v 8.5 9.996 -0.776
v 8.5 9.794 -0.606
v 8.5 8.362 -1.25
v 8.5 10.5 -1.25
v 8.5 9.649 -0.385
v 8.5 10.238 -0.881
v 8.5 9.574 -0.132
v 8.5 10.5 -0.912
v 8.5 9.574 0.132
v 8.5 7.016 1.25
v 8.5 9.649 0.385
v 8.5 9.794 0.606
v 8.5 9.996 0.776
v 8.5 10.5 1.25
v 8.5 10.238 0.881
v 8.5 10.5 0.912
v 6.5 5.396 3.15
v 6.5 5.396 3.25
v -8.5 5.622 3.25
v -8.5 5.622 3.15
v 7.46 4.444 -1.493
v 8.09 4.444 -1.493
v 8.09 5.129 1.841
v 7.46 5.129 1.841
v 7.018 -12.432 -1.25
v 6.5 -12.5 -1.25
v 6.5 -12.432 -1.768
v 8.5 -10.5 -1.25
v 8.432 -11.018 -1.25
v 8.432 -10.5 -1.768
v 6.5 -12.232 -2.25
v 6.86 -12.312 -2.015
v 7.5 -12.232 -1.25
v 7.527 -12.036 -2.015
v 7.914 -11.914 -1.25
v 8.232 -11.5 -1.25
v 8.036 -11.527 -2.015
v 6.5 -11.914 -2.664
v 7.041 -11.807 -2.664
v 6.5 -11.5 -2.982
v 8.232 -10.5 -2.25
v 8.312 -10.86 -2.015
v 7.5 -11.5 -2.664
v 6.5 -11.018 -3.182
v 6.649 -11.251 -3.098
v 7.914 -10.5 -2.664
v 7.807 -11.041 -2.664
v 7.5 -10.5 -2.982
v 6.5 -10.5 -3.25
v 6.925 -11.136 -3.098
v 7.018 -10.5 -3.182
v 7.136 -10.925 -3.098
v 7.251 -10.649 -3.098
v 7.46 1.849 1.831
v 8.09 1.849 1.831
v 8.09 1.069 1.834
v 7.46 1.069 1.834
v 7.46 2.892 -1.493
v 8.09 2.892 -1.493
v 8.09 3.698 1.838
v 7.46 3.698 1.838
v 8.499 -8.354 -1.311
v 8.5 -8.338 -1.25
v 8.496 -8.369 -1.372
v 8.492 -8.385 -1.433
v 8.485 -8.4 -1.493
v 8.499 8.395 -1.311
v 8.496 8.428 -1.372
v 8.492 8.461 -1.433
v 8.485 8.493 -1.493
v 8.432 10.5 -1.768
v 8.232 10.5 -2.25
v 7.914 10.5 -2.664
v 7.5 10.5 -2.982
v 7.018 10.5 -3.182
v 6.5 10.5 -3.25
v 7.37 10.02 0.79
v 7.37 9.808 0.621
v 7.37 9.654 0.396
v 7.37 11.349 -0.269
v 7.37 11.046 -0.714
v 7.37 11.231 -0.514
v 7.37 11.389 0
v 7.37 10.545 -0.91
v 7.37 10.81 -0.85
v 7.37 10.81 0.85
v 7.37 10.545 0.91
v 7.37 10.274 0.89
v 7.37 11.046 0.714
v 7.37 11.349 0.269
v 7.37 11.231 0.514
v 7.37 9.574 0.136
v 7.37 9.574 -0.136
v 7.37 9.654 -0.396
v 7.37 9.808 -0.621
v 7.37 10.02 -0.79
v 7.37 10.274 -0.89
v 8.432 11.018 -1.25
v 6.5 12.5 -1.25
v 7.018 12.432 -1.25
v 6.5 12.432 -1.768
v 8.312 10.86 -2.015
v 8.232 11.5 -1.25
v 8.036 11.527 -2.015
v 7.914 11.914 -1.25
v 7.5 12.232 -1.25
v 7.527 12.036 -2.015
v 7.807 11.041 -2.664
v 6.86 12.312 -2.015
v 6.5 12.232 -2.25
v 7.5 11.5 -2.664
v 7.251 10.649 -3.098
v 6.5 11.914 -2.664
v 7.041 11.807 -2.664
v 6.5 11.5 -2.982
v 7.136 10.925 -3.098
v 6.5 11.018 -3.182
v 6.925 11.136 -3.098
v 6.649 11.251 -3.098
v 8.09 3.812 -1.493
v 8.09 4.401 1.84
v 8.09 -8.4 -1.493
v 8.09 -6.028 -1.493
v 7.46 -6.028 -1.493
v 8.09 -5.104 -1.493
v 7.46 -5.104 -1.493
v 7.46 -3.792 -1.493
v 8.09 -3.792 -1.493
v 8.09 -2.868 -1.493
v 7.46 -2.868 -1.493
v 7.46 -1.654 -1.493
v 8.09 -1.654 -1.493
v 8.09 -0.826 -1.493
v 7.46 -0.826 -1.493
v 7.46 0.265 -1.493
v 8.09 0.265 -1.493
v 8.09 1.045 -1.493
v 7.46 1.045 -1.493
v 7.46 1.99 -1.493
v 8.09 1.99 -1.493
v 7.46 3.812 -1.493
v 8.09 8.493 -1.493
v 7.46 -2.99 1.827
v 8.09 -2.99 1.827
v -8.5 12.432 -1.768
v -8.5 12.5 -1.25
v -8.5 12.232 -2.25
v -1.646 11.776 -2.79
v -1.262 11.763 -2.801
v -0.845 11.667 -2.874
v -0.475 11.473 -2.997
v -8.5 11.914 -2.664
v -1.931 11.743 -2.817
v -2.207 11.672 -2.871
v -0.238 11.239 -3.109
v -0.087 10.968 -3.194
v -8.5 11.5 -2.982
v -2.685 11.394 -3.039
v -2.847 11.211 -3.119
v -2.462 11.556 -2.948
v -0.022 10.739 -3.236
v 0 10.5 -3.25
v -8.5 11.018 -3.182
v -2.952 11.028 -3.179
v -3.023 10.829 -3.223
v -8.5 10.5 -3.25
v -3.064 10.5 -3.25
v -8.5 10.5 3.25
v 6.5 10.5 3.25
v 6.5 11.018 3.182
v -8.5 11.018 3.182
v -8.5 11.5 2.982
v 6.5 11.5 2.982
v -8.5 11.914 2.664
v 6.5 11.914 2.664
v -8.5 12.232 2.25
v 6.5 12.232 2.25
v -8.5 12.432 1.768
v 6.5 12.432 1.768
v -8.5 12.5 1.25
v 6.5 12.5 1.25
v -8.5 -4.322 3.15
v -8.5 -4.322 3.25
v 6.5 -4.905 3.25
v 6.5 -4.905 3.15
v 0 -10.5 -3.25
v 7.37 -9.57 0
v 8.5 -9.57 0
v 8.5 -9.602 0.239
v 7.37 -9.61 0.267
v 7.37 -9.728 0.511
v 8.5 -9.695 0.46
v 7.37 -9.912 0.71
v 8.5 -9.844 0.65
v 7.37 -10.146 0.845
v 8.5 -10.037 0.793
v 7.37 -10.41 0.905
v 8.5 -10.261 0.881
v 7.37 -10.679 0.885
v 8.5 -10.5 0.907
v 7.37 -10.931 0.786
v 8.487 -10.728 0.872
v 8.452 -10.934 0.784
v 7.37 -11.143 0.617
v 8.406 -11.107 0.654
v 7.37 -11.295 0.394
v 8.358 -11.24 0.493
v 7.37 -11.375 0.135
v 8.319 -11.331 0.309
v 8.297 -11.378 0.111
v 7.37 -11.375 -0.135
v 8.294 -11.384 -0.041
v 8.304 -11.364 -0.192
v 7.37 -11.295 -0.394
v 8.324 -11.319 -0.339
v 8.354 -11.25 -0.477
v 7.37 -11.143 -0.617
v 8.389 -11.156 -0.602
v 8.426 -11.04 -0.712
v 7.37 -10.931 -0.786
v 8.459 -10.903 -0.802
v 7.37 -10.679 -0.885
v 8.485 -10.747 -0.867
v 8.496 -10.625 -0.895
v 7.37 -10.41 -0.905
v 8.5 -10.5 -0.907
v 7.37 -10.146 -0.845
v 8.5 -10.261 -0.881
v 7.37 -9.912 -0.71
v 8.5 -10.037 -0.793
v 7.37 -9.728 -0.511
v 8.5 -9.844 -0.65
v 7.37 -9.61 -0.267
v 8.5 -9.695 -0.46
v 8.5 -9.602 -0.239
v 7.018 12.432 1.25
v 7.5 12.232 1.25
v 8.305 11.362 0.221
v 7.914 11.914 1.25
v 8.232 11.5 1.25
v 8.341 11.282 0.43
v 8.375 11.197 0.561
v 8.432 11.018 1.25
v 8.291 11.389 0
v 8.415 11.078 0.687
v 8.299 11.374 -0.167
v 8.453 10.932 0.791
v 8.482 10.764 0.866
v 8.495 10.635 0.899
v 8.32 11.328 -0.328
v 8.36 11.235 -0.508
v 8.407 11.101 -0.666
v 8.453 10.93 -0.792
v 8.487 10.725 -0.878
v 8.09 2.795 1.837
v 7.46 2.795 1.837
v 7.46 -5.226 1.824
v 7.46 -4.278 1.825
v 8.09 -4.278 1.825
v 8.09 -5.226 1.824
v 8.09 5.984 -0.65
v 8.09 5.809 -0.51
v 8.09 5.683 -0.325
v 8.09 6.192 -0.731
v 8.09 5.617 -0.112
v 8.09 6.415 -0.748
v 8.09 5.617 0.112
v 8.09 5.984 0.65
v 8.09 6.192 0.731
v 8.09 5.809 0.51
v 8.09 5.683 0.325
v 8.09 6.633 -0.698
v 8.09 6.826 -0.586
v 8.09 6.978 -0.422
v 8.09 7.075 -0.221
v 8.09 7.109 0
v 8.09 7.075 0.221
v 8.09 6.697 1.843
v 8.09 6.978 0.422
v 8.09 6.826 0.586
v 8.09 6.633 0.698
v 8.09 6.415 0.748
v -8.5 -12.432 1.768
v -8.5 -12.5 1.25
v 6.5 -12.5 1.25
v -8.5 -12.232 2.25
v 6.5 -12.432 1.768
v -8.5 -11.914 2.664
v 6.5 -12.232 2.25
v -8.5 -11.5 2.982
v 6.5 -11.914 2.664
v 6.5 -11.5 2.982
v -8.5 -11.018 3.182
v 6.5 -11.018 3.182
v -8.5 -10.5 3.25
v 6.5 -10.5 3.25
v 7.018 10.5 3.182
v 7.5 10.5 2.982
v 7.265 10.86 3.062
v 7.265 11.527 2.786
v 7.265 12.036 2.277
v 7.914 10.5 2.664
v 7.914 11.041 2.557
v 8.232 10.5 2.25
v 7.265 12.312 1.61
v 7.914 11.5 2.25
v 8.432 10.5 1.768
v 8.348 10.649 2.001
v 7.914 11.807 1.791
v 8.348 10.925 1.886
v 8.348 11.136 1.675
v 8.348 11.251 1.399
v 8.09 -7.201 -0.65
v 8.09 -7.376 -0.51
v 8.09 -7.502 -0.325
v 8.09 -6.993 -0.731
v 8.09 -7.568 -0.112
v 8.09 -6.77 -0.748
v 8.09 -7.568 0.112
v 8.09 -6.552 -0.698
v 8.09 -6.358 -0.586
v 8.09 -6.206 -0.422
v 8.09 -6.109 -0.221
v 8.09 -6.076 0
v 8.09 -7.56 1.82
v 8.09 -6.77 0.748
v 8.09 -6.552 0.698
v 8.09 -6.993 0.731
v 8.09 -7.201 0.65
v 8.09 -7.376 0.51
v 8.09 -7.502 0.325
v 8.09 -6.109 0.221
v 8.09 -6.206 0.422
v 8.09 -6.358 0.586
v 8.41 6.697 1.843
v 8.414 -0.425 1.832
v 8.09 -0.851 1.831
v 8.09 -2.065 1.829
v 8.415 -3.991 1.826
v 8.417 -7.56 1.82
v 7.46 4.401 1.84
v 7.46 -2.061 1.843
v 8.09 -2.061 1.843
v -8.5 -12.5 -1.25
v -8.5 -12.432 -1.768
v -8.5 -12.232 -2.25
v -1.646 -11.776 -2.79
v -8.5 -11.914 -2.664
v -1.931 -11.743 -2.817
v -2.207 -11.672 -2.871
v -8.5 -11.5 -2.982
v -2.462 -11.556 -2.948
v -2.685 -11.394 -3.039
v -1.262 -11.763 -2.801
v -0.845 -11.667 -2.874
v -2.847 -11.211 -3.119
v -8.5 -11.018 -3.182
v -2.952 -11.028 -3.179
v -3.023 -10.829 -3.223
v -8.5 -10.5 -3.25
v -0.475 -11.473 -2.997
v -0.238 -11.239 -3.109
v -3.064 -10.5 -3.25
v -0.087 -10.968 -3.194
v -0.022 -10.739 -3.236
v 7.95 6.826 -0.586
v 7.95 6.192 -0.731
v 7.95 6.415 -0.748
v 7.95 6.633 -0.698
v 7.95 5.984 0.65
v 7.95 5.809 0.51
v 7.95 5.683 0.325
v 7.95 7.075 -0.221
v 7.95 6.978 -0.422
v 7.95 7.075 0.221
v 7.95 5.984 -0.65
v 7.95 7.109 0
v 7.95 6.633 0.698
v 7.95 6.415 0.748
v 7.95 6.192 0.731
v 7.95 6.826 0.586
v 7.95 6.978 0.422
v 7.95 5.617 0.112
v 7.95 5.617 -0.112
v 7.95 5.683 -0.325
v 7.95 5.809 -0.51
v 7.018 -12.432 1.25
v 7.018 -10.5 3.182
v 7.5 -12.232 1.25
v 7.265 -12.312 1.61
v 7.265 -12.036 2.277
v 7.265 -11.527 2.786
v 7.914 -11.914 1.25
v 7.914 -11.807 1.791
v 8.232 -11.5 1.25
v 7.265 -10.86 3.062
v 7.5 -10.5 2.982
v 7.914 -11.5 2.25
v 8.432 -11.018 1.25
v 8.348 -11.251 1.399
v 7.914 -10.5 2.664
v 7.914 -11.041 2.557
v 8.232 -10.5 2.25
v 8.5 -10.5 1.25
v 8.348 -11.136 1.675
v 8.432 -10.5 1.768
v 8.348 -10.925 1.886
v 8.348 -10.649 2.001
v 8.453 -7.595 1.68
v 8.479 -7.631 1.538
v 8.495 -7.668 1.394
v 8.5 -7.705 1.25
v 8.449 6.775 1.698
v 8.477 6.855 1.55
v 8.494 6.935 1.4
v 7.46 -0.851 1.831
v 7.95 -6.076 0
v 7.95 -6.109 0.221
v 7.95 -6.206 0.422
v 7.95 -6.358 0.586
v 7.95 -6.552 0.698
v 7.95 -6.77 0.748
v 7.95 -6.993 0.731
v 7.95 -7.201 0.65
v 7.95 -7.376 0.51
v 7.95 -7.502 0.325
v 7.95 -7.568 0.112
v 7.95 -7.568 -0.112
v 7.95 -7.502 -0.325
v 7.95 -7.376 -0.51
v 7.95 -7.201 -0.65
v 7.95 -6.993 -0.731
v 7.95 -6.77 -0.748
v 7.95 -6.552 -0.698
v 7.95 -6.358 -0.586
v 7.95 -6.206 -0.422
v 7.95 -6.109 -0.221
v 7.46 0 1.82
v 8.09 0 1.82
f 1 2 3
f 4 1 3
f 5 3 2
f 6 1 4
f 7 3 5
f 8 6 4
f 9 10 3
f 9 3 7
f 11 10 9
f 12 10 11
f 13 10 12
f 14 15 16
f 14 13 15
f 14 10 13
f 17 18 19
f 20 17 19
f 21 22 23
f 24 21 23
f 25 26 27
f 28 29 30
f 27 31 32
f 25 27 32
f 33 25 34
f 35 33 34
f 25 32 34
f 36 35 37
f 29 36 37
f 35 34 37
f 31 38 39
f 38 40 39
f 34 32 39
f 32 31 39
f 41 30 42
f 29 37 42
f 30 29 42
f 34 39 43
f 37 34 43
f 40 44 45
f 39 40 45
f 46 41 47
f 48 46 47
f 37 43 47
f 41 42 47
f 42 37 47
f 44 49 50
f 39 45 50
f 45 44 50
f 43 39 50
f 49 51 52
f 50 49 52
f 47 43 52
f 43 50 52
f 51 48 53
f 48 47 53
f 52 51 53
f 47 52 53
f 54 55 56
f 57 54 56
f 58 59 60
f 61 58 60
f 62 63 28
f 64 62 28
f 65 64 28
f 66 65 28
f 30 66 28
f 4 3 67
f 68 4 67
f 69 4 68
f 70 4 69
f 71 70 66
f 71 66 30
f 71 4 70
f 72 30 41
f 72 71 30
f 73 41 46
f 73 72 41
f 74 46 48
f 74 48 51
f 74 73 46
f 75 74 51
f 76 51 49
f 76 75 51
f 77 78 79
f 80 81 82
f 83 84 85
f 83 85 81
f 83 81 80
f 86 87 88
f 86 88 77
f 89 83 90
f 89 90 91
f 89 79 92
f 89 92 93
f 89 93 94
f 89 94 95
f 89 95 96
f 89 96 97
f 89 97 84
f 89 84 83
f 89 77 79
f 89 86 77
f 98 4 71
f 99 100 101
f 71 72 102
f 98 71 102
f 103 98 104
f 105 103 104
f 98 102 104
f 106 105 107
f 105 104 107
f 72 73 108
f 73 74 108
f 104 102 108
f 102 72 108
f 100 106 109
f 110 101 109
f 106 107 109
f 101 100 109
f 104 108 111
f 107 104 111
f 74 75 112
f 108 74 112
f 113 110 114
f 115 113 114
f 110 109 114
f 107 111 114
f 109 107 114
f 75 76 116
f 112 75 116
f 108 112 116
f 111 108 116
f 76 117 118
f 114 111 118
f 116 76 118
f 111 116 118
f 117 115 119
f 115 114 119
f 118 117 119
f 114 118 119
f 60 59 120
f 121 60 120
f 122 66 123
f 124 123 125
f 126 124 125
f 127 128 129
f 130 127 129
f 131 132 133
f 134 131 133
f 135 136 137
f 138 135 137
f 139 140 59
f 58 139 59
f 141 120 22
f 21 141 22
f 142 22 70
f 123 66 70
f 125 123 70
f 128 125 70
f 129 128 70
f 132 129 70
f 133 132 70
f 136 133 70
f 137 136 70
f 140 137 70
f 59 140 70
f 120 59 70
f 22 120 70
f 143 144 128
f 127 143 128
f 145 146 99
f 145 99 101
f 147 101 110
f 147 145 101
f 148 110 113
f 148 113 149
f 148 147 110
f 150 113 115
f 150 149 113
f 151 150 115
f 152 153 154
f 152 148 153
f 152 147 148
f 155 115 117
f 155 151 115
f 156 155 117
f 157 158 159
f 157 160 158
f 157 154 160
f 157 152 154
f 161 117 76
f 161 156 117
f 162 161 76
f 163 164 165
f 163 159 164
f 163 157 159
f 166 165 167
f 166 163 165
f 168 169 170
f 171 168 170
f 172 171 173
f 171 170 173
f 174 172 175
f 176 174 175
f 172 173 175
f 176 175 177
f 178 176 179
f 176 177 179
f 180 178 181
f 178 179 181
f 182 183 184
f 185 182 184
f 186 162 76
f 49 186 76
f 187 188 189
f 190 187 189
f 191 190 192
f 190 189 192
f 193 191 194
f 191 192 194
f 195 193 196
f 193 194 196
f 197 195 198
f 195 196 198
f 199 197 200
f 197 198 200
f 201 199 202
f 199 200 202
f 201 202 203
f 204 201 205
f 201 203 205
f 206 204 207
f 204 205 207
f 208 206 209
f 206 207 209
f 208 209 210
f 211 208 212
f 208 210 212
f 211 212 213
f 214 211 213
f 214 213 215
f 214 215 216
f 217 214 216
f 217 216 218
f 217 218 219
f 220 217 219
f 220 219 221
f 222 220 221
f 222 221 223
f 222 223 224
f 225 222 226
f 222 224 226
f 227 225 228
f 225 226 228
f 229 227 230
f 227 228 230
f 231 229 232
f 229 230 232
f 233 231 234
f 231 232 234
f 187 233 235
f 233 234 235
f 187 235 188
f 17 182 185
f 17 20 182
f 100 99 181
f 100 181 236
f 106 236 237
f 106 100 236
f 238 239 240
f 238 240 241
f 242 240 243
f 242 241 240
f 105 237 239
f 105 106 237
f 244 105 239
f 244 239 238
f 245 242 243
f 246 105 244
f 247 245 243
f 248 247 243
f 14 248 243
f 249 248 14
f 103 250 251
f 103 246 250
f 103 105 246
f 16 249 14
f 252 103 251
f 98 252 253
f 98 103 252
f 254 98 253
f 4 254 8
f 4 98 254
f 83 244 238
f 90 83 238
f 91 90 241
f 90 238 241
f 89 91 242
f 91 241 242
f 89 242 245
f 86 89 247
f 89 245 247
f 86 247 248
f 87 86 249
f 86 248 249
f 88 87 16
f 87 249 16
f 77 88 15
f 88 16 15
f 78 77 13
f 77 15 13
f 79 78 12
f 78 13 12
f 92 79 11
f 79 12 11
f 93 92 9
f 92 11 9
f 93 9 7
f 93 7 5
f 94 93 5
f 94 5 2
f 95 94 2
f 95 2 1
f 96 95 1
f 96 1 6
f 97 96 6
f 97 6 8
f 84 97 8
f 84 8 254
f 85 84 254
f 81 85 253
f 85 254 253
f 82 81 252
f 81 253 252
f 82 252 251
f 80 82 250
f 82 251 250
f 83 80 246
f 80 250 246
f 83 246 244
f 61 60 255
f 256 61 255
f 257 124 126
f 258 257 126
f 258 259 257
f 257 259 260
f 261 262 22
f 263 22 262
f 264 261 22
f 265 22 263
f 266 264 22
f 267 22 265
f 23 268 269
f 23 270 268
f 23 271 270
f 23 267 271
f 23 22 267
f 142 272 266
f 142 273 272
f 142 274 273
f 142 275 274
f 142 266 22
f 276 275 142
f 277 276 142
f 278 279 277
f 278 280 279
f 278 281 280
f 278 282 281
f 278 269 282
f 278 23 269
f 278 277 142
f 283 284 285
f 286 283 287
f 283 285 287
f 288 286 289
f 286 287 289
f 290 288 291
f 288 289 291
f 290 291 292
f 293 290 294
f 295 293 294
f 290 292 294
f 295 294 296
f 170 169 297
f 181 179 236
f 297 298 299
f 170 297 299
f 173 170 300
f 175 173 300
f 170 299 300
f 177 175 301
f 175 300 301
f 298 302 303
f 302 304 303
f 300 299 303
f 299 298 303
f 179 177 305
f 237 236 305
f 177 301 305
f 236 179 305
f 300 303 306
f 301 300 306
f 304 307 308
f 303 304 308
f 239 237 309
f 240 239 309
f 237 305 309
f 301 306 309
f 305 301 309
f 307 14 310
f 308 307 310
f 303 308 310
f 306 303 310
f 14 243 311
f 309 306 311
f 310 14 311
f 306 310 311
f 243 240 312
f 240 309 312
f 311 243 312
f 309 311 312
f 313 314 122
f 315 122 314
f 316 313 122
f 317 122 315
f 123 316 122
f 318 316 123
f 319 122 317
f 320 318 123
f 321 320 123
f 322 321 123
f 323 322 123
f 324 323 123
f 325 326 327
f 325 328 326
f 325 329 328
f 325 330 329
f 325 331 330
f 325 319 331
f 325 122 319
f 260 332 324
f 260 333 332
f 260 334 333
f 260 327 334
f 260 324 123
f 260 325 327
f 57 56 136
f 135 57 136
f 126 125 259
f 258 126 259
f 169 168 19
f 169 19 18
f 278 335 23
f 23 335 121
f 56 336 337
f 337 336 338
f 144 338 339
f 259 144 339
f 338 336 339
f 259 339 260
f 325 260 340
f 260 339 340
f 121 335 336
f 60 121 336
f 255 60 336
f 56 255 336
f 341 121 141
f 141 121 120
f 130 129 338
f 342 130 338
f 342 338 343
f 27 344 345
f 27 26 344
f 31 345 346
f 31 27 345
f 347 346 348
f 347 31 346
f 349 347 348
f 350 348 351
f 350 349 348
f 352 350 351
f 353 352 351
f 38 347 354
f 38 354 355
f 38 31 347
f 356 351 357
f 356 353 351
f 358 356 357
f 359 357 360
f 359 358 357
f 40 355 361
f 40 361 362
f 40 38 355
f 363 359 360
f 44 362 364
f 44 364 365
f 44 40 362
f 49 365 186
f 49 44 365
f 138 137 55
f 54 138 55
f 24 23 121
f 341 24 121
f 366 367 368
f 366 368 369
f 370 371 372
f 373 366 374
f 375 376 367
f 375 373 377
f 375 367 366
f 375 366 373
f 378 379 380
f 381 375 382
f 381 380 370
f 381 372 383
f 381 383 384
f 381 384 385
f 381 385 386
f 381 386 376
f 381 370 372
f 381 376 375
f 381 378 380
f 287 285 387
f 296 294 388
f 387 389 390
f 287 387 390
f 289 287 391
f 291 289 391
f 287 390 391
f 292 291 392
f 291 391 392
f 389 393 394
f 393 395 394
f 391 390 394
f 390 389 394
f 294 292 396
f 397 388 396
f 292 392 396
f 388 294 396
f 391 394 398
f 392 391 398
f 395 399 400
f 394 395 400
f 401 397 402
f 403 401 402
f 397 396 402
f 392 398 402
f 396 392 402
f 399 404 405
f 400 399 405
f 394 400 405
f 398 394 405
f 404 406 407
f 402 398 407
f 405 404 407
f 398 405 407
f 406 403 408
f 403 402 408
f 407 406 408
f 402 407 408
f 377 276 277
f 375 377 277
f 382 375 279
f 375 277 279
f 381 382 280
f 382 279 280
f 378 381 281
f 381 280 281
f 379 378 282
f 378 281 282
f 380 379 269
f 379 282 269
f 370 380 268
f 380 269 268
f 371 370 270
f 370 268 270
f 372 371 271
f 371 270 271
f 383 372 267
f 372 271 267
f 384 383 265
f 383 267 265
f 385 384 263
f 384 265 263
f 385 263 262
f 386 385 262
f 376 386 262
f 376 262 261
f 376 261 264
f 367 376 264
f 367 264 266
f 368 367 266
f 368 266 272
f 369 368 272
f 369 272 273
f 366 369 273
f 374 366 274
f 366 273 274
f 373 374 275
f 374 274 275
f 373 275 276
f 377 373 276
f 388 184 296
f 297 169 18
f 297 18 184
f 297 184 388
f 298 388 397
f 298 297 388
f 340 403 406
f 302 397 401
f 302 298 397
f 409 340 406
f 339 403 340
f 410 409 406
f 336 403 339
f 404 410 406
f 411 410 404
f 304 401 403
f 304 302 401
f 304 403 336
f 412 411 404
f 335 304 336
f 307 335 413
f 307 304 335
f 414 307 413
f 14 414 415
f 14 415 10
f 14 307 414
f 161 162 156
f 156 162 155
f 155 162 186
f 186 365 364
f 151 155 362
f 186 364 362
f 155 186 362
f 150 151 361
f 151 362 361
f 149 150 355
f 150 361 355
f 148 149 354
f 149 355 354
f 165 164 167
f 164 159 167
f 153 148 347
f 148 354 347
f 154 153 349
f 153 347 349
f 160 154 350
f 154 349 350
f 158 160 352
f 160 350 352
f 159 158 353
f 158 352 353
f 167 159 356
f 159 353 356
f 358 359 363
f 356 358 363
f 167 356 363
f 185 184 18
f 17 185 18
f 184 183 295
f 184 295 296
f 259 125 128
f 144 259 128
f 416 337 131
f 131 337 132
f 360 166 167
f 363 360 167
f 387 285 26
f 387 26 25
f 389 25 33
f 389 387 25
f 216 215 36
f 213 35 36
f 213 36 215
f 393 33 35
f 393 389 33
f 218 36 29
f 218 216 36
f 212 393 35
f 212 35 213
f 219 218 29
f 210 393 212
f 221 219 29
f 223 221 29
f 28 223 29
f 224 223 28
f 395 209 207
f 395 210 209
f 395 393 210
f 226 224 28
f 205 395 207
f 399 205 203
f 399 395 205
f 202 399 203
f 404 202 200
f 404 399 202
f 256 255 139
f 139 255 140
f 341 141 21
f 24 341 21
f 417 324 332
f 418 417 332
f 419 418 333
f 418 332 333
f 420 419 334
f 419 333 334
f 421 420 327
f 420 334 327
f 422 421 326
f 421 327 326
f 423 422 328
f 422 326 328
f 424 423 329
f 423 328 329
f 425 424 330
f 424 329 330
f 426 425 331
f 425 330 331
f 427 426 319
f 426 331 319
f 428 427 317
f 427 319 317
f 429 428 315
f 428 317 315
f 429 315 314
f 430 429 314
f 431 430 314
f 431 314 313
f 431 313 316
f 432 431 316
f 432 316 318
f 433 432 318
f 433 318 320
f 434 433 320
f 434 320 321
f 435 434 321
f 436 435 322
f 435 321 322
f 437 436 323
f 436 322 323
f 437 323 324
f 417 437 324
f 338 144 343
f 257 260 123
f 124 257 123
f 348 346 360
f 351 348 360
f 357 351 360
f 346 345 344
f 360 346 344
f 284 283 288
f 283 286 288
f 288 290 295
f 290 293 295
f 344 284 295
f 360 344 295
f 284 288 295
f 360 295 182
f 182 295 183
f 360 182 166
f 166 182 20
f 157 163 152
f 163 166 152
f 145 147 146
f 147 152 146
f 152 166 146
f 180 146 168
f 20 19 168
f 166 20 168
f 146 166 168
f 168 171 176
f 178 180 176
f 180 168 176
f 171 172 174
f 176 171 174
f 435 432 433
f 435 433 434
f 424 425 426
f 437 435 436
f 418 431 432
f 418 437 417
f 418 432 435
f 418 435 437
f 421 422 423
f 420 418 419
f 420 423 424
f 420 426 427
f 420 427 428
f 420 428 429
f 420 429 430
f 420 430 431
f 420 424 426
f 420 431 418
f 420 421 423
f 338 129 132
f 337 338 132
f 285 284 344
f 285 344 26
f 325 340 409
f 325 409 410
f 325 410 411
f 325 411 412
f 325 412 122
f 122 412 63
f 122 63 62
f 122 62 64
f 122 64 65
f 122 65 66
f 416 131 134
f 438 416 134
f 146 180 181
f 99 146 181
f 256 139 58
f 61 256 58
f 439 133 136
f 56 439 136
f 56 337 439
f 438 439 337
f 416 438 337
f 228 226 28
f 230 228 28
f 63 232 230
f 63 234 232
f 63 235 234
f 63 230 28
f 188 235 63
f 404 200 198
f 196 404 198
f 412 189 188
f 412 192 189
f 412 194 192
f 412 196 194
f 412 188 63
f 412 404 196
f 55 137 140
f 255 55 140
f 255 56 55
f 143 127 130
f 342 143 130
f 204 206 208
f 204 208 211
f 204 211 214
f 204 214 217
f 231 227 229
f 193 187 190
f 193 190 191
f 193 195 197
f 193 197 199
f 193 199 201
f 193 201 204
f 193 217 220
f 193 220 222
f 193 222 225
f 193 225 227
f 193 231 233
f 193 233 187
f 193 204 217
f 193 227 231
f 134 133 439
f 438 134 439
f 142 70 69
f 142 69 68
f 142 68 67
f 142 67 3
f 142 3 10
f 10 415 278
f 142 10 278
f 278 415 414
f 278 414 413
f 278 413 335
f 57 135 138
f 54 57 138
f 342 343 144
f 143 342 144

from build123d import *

# Parameters (mm, degrees)
F0_W      = 17
F0_H      = 25
F1_DEPTH  = 3.25
F3_DEPTH  = 29
F4_R      = 2
F5_R      = 2
F6_R      = 2
F7_R      = 2
F8_R      = 0.907486
F8_R_2    = 0.912689
F9_DEPTH  = 1.13
F11_DEPTH = 0.41
F12_R     = 0.75
F13_DEPTH = 0.14
F15_DEPTH = 0.63
F17_DEPTH = 0.1


with BuildPart() as f1:
    # F0 (on Top) → F1 (new body, symmetric)
    with BuildSketch(Plane.XY):
        Rectangle(F0_W, F0_H)
    extrude(amount=F1_DEPTH, both=True)

    # F2 (on face) → F3 (cut)
    with BuildSketch(Plane.XZ.offset(12.5)):
        with BuildLine():
            Line((-3.064445, -3.25), (0, -3.25))
            ThreePointArc((0, -3.25), (-1.532222, -2.787639), (-3.064445, -3.25))
        make_face()
    extrude(amount=-F3_DEPTH, mode=Mode.SUBTRACT)

    # F4
    f4_edges = [f1.edges().sort_by_distance(p)[0] for p in [
        (0, -12.5, 3.25),
    ]]
    fillet(f4_edges, radius=F4_R)

    # F5
    f5_edges = [f1.edges().sort_by_distance(p)[0] for p in [
        (0, 12.5, 3.25),
    ]]
    fillet(f5_edges, radius=F5_R)

    # F6
    f6_edges = [f1.edges().sort_by_distance(p)[0] for p in [
        (8.5, 0, 3.25),
    ]]
    fillet(f6_edges, radius=F6_R)

    # F7
    f7_edges = [f1.edges().sort_by_distance(p)[0] for p in [
        (8.5, 0, -3.25),
    ]]
    fillet(f7_edges, radius=F7_R)

    # F8 (on face) → F9 (cut)
    with BuildSketch(Plane.YZ.offset(8.5)):
        with Locations((-10.477439, 0)):
            Circle(F8_R)
        with Locations((10.476667, 0)):
            Circle(F8_R_2)
    extrude(amount=-F9_DEPTH, mode=Mode.SUBTRACT)

    # F10 (on face) → F11 (cut)
    with BuildSketch(Plane.YZ.offset(8.5)):
        Polygon((6.696667, 1.843333), (-7.56, 1.82), (-8.4, -1.493333), (8.493334, -1.493333), align=None)
    extrude(amount=-F11_DEPTH, mode=Mode.SUBTRACT)

    # F12 (on face) → F13 (cut)
    with BuildSketch(Plane.YZ.offset(8.09)):
        with Locations((-6.826031, 0)):
            Circle(F12_R)
        with Locations((6.358803, 0)):
            Circle(F12_R)
    extrude(amount=-F13_DEPTH, mode=Mode.SUBTRACT)

    # F14 (on face) → F15 (cut)
    with BuildSketch(Plane.YZ.offset(8.09)):
        Polygon((-4.277901, 1.825372), (-5.225895, 1.82382), (-6.027778, -1.493333), (-5.104167, -1.493333), align=None)
        Polygon((-2.061455, 1.843333), (-2.989631, 1.82748), (-3.792398, -1.493333), (-2.868056, -1.493333), align=None)
        Polygon((0, 1.82), (-0.850787, 1.830981), (-1.654401, -1.493333), (-0.826389, -1.493333), align=None)
        Polygon((1.848753, 1.830981), (1.069426, 1.834123), (0.265052, -1.493333), (1.045139, -1.493333), align=None)
        Polygon((3.697775, 1.838425), (2.795116, 1.836948), (1.990059, -1.493333), (2.892361, -1.493333), align=None)
        Polygon((3.81221, -1.493333), (4.443903, -1.493333), (5.128974, 1.840768), (4.401408, 1.839577), align=None)
    extrude(amount=-F15_DEPTH, mode=Mode.SUBTRACT)

    # F16 (on face) → F17 (cut)
    with BuildSketch(Plane.XY.offset(3.25)):
        Polygon((-8.5, -4.322258), (6.5, -4.90492), (6.5, 5.395623), (-8.5, 5.621705), align=None)
    extrude(amount=-F17_DEPTH, mode=Mode.SUBTRACT)


solid = f1.part
